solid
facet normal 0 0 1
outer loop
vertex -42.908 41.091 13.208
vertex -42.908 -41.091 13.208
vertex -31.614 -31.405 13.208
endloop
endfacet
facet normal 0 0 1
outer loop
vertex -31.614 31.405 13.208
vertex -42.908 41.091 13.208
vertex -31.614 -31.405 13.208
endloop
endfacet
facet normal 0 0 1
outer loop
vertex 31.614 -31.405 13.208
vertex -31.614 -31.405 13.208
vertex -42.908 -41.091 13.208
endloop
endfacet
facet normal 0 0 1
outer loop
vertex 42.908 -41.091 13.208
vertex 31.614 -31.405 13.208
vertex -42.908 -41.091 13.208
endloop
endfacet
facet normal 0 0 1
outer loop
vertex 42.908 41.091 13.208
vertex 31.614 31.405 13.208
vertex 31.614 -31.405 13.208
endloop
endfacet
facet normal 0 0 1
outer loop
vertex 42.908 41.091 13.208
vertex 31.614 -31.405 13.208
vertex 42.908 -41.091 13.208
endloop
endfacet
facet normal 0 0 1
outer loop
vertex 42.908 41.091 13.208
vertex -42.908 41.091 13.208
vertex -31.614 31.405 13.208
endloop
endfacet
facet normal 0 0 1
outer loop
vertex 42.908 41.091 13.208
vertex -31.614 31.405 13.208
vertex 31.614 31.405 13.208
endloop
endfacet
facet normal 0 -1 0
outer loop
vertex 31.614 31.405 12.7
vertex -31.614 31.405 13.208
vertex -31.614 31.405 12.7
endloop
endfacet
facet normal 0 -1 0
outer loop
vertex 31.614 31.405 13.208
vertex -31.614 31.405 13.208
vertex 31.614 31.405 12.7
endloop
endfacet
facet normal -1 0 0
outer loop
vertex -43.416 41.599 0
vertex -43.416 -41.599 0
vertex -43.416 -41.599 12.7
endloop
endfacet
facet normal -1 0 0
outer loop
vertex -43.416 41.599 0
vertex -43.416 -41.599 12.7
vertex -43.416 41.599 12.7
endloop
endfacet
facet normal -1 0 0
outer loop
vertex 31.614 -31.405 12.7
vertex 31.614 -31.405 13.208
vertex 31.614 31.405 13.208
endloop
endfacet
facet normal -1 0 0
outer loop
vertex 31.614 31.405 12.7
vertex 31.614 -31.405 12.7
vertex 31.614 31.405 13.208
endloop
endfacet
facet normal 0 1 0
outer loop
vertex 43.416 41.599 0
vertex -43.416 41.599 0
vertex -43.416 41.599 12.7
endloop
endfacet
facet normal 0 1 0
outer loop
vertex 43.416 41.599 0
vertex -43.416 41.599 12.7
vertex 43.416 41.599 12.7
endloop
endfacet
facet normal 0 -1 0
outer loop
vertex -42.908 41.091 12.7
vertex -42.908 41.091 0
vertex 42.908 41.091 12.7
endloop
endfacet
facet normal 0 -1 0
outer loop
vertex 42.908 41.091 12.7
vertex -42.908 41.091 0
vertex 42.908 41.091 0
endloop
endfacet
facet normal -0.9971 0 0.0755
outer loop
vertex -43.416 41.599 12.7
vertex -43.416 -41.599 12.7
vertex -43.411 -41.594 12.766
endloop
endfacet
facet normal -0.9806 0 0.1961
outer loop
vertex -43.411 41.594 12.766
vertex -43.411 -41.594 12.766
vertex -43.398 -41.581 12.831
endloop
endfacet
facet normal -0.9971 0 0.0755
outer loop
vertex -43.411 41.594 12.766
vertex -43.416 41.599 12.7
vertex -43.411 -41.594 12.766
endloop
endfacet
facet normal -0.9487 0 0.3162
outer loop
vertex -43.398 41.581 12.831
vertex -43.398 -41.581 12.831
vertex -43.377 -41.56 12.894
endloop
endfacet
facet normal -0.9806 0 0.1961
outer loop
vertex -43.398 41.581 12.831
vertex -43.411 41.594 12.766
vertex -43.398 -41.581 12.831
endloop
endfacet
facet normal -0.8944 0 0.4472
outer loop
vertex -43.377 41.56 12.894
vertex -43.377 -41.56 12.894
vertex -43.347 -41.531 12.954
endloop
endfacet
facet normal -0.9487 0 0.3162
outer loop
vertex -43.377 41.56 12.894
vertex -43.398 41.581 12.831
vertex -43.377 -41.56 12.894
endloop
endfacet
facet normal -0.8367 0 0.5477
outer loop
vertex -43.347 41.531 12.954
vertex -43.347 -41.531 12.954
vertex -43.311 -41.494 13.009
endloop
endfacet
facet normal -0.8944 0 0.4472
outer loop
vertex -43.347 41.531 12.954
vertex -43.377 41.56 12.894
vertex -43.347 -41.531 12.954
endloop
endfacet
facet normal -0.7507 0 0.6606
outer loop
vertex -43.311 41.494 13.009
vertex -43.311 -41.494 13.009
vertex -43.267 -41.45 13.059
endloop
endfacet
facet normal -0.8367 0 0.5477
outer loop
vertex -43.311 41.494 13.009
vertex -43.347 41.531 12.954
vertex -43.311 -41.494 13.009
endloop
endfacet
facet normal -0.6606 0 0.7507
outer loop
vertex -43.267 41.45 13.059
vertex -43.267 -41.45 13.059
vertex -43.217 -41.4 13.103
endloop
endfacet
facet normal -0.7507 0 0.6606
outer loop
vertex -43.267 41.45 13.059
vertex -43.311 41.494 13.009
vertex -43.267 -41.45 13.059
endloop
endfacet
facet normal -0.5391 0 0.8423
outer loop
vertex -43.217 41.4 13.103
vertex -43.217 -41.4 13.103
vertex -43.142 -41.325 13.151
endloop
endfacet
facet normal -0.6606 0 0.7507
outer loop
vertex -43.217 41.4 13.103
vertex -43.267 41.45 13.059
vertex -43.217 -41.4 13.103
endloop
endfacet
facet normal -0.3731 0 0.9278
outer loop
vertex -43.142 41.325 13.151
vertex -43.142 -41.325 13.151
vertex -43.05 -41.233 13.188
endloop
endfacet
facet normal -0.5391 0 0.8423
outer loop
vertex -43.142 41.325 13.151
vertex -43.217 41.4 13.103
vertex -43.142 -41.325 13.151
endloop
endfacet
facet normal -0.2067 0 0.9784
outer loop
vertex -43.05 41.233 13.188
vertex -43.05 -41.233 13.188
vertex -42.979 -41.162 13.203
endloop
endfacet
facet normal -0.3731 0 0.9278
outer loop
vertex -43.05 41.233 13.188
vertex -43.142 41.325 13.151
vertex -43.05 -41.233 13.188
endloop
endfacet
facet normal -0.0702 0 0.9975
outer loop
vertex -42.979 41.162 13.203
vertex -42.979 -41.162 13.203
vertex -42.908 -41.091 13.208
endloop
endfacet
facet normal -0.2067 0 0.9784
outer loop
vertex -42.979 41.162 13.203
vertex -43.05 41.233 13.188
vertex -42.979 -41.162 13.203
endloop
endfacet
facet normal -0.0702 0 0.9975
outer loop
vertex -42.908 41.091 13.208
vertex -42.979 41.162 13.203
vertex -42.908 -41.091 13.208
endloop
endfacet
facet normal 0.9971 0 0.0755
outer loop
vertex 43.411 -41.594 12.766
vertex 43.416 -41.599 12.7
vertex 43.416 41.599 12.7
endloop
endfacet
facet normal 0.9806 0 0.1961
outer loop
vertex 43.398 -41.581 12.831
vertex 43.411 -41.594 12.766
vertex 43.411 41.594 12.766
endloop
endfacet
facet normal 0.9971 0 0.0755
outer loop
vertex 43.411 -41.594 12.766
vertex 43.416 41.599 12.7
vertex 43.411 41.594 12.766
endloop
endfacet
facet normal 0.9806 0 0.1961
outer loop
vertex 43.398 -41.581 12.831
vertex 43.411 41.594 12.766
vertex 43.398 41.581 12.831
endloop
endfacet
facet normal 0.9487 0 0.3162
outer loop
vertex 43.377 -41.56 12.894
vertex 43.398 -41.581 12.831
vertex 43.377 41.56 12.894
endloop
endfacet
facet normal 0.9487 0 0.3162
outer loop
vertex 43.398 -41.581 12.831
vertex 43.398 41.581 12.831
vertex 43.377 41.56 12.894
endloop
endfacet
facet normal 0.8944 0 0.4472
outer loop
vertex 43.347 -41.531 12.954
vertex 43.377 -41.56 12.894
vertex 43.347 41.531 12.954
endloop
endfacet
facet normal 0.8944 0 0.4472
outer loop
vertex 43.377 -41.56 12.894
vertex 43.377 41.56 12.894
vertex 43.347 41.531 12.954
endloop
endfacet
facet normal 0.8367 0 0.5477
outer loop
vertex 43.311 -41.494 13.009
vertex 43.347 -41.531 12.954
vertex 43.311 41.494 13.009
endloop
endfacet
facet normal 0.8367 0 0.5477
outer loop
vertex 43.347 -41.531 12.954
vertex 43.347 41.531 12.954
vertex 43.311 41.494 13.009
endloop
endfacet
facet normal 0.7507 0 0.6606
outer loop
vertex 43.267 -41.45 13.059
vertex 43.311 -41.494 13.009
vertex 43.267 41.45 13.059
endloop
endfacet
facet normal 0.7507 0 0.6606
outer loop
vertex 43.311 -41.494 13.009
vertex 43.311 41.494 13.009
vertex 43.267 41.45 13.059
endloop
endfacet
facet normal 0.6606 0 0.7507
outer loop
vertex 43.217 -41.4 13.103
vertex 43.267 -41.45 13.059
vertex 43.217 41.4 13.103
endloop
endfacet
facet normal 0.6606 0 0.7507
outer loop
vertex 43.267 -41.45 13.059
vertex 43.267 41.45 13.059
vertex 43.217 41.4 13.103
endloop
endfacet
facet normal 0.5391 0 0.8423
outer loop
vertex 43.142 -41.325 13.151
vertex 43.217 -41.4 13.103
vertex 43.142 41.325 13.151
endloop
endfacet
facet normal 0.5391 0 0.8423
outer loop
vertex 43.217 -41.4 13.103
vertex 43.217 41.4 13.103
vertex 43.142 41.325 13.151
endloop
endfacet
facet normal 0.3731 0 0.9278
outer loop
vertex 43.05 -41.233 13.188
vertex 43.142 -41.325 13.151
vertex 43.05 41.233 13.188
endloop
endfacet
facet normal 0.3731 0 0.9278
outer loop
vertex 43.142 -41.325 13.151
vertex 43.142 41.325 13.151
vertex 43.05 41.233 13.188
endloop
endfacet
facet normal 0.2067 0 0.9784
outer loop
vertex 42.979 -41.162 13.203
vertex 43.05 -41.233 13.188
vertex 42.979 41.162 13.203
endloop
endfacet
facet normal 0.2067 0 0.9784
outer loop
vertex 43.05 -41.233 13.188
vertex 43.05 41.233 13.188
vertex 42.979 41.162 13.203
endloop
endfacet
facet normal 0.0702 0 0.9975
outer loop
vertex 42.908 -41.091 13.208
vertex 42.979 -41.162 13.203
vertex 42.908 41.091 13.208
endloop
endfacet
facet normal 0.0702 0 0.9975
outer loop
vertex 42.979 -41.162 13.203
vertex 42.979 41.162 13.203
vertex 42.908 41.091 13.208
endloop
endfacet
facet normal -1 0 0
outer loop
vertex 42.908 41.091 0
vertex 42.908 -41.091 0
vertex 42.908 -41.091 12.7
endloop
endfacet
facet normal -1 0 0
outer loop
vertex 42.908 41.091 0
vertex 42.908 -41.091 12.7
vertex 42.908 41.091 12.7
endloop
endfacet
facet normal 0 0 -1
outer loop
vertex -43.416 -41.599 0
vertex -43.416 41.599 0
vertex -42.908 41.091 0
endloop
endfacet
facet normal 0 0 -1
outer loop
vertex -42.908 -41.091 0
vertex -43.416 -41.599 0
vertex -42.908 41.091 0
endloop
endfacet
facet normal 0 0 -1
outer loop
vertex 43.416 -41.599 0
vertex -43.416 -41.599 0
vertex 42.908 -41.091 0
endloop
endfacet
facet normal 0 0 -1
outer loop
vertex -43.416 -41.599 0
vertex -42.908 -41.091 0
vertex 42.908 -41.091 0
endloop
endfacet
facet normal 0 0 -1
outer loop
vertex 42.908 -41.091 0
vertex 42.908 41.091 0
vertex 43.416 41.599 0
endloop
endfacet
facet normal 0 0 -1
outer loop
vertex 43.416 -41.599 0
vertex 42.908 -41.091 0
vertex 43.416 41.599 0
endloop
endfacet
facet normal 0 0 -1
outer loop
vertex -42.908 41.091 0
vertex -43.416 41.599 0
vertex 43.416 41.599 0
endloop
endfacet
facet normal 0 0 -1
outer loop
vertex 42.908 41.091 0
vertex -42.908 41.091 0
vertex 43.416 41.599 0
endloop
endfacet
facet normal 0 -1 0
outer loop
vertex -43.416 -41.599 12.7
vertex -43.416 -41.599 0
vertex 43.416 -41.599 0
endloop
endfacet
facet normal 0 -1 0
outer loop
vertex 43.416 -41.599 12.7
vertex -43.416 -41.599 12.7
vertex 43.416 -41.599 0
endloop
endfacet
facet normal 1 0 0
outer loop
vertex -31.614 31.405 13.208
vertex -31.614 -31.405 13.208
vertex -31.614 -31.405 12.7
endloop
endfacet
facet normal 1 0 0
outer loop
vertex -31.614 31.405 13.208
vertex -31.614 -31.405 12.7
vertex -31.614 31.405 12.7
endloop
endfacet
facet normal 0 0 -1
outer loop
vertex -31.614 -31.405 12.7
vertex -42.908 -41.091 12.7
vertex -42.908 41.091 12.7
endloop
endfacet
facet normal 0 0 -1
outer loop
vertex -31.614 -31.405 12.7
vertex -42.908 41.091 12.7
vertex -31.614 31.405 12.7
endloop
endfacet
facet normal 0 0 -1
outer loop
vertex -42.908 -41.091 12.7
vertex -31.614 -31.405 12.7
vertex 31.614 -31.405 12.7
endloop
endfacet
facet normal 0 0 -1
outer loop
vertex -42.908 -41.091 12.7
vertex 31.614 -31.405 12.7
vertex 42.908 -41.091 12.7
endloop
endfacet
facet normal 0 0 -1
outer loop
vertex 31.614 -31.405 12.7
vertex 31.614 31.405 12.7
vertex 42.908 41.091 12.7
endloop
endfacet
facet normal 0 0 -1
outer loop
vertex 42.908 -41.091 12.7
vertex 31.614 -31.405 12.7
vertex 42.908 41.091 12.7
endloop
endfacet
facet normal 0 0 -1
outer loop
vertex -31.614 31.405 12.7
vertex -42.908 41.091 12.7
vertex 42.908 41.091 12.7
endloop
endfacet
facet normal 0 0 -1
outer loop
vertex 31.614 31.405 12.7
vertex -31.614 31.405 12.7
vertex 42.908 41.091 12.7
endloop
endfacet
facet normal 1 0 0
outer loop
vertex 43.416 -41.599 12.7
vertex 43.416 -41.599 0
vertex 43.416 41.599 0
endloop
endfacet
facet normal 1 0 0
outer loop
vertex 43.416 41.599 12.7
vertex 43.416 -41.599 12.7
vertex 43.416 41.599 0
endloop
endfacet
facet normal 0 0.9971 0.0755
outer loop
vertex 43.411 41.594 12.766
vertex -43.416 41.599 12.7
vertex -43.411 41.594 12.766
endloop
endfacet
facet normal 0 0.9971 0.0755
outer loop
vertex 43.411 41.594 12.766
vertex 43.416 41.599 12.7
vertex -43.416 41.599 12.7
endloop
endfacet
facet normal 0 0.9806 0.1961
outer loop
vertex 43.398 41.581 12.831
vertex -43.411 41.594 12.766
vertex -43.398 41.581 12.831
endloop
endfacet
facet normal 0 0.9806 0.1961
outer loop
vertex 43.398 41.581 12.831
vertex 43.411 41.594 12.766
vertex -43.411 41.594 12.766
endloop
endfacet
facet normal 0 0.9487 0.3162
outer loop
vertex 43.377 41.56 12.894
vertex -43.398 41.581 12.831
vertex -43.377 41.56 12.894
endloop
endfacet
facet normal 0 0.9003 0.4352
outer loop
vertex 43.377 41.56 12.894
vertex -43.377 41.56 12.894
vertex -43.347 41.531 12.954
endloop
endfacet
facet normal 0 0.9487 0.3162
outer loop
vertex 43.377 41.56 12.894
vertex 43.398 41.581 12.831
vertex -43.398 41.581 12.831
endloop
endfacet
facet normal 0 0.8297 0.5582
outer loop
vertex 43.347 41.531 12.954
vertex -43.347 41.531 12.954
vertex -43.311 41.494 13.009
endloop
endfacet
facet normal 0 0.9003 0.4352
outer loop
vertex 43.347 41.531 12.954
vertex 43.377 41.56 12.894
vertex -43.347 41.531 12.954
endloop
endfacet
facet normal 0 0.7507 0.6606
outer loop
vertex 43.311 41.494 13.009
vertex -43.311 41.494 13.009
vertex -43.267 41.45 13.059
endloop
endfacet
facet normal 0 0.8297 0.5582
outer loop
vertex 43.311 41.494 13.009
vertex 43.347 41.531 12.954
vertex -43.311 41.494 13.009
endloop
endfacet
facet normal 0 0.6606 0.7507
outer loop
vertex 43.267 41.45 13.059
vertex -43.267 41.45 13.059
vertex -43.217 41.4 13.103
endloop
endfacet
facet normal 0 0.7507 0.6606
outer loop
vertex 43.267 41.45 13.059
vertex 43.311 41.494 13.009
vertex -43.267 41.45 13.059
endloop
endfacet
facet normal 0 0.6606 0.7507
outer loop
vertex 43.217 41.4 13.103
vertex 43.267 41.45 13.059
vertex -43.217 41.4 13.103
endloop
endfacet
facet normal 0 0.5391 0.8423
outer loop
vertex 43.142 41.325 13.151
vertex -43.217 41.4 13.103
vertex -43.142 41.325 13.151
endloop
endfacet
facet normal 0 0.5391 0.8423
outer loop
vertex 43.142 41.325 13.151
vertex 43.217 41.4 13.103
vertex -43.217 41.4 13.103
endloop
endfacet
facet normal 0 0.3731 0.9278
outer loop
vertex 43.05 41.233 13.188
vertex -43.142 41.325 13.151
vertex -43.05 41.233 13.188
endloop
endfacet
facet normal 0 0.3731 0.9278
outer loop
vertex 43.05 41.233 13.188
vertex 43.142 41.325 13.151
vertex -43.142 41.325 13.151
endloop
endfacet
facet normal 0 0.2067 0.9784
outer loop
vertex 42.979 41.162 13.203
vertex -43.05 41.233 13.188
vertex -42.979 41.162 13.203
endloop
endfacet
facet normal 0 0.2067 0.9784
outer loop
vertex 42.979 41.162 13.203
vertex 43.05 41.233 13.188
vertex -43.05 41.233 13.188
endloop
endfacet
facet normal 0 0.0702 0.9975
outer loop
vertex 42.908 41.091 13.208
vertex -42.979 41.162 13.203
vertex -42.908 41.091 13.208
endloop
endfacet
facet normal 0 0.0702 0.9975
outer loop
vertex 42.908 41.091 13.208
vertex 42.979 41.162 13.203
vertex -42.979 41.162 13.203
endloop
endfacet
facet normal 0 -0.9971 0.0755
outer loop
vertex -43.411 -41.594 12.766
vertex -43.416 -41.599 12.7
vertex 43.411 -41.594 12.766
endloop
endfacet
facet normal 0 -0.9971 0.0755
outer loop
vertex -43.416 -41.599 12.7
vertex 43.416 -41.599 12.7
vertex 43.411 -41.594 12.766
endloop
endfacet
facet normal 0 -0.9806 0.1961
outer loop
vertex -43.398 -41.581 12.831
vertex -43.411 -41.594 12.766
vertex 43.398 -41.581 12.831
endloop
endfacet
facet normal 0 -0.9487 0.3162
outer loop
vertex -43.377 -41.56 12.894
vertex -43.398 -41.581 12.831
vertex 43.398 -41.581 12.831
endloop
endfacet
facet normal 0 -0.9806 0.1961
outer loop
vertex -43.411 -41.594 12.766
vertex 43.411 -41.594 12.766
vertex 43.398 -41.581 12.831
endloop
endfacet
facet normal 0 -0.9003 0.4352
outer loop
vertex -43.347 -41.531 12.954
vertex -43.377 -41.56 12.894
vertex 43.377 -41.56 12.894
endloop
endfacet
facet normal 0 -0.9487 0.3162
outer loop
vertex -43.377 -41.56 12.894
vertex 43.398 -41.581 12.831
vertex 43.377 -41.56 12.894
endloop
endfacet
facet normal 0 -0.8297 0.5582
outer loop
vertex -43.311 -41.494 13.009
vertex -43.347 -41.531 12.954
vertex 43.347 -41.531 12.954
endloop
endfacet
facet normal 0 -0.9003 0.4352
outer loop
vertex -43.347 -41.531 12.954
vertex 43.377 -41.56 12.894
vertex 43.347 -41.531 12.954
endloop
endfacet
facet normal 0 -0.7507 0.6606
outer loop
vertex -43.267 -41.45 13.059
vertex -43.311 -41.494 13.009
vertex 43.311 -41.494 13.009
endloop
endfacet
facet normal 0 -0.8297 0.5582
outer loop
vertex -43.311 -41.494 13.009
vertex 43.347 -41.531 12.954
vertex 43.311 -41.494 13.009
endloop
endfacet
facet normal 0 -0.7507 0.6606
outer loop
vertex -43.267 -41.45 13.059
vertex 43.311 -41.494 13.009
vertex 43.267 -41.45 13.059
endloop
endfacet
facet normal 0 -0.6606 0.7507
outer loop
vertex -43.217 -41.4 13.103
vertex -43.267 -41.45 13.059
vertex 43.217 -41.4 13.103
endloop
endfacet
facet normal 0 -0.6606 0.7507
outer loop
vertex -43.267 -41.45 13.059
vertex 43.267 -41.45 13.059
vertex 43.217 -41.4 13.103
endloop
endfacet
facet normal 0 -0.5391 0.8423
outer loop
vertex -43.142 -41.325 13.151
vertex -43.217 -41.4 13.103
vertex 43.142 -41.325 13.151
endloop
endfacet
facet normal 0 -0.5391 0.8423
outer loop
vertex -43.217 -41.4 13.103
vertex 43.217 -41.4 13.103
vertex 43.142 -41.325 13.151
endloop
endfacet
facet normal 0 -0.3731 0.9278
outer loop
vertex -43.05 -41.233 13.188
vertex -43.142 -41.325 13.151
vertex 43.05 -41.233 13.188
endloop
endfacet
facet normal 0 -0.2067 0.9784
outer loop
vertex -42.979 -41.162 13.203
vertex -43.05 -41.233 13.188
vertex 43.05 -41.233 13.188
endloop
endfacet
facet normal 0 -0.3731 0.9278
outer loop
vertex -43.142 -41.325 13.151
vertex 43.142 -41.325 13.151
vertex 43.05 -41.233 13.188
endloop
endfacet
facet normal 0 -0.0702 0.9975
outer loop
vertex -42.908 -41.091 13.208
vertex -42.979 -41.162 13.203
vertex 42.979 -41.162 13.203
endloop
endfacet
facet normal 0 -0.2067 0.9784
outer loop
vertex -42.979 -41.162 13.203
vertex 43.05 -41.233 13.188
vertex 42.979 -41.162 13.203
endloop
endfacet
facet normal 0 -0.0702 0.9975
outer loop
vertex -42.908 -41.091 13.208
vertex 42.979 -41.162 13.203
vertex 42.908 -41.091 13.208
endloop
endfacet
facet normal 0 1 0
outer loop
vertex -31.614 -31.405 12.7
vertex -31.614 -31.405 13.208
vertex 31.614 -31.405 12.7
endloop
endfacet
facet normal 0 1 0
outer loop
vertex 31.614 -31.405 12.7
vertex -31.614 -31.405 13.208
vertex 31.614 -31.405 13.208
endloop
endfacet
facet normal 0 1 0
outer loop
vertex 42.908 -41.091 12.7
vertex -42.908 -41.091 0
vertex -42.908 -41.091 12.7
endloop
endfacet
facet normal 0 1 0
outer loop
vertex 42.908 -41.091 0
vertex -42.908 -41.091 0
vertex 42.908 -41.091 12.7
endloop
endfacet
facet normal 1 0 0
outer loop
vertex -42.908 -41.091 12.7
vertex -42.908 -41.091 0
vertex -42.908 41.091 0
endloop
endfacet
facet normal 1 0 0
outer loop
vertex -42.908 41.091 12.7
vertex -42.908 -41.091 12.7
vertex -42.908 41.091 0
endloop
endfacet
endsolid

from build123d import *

# Parameters (mm, degrees)
F0_W     = 86.8310853839
F0_H     = 83.1971988082
F1_DEPTH = 13.208
F2_R     = 0.508
F3_T     = 0.508
F4_W     = 63.2273703814
F4_H     = 62.8109127283
F5_DEPTH = 17.272


# Not quite as in the source:
# - a shell that OpenCascade refuses in one call is made with other operations: the cavity is built on its own and cut out


with BuildPart() as f1:
    # F0 (on Top) → F1 (new body)
    with BuildSketch(Plane.XY):
        Rectangle(F0_W, F0_H)
    extrude(amount=F1_DEPTH)

    # F2
    f2_edges = [f1.edges().sort_by_distance(p)[0] for p in [
        (0, -41.598599, 13.208),
        (-43.415543, 0, 13.208),
        (0, 41.598599, 13.208),
        (43.415543, 0, 13.208),
    ]]
    fillet(f2_edges, radius=F2_R)

    # F3: shell of thickness 0.508, made by hand


with BuildPart() as f3_core1:
    # F3_t2: copy of F1
    add(f1.part)

    # the walls: a layer under each face that stays
    f3_faces = [f3_core1.faces().sort_by_distance(p)[0] for p in [
        (0, -41.5985994041, 6.35),
        (-43.4155426919, 0, 6.35),
        (43.4155426919, 0, 6.35),
        (0, 41.5985994041, 6.35),
        (0, 0, 13.208),
    ]]
    thicken(f3_faces, amount=-F3_T, mode=Mode.SUBTRACT)


with BuildPart() as f1_1:
    add(f1.part)

    # what is left inside the walls is the cavity
    f3_cavity = [f3_core1.part.solids().sort_by_distance(p)[0] for p in [
        (0, -13.696866, 12.69492),
    ]]
    add(f3_cavity, mode=Mode.SUBTRACT)

    # F4 (on face) → F5 (cut)
    with BuildSketch(Plane.XY.offset(13.208)):
        Rectangle(F4_W, F4_H)
    extrude(amount=-F5_DEPTH, mode=Mode.SUBTRACT)


solid = f1_1.part
